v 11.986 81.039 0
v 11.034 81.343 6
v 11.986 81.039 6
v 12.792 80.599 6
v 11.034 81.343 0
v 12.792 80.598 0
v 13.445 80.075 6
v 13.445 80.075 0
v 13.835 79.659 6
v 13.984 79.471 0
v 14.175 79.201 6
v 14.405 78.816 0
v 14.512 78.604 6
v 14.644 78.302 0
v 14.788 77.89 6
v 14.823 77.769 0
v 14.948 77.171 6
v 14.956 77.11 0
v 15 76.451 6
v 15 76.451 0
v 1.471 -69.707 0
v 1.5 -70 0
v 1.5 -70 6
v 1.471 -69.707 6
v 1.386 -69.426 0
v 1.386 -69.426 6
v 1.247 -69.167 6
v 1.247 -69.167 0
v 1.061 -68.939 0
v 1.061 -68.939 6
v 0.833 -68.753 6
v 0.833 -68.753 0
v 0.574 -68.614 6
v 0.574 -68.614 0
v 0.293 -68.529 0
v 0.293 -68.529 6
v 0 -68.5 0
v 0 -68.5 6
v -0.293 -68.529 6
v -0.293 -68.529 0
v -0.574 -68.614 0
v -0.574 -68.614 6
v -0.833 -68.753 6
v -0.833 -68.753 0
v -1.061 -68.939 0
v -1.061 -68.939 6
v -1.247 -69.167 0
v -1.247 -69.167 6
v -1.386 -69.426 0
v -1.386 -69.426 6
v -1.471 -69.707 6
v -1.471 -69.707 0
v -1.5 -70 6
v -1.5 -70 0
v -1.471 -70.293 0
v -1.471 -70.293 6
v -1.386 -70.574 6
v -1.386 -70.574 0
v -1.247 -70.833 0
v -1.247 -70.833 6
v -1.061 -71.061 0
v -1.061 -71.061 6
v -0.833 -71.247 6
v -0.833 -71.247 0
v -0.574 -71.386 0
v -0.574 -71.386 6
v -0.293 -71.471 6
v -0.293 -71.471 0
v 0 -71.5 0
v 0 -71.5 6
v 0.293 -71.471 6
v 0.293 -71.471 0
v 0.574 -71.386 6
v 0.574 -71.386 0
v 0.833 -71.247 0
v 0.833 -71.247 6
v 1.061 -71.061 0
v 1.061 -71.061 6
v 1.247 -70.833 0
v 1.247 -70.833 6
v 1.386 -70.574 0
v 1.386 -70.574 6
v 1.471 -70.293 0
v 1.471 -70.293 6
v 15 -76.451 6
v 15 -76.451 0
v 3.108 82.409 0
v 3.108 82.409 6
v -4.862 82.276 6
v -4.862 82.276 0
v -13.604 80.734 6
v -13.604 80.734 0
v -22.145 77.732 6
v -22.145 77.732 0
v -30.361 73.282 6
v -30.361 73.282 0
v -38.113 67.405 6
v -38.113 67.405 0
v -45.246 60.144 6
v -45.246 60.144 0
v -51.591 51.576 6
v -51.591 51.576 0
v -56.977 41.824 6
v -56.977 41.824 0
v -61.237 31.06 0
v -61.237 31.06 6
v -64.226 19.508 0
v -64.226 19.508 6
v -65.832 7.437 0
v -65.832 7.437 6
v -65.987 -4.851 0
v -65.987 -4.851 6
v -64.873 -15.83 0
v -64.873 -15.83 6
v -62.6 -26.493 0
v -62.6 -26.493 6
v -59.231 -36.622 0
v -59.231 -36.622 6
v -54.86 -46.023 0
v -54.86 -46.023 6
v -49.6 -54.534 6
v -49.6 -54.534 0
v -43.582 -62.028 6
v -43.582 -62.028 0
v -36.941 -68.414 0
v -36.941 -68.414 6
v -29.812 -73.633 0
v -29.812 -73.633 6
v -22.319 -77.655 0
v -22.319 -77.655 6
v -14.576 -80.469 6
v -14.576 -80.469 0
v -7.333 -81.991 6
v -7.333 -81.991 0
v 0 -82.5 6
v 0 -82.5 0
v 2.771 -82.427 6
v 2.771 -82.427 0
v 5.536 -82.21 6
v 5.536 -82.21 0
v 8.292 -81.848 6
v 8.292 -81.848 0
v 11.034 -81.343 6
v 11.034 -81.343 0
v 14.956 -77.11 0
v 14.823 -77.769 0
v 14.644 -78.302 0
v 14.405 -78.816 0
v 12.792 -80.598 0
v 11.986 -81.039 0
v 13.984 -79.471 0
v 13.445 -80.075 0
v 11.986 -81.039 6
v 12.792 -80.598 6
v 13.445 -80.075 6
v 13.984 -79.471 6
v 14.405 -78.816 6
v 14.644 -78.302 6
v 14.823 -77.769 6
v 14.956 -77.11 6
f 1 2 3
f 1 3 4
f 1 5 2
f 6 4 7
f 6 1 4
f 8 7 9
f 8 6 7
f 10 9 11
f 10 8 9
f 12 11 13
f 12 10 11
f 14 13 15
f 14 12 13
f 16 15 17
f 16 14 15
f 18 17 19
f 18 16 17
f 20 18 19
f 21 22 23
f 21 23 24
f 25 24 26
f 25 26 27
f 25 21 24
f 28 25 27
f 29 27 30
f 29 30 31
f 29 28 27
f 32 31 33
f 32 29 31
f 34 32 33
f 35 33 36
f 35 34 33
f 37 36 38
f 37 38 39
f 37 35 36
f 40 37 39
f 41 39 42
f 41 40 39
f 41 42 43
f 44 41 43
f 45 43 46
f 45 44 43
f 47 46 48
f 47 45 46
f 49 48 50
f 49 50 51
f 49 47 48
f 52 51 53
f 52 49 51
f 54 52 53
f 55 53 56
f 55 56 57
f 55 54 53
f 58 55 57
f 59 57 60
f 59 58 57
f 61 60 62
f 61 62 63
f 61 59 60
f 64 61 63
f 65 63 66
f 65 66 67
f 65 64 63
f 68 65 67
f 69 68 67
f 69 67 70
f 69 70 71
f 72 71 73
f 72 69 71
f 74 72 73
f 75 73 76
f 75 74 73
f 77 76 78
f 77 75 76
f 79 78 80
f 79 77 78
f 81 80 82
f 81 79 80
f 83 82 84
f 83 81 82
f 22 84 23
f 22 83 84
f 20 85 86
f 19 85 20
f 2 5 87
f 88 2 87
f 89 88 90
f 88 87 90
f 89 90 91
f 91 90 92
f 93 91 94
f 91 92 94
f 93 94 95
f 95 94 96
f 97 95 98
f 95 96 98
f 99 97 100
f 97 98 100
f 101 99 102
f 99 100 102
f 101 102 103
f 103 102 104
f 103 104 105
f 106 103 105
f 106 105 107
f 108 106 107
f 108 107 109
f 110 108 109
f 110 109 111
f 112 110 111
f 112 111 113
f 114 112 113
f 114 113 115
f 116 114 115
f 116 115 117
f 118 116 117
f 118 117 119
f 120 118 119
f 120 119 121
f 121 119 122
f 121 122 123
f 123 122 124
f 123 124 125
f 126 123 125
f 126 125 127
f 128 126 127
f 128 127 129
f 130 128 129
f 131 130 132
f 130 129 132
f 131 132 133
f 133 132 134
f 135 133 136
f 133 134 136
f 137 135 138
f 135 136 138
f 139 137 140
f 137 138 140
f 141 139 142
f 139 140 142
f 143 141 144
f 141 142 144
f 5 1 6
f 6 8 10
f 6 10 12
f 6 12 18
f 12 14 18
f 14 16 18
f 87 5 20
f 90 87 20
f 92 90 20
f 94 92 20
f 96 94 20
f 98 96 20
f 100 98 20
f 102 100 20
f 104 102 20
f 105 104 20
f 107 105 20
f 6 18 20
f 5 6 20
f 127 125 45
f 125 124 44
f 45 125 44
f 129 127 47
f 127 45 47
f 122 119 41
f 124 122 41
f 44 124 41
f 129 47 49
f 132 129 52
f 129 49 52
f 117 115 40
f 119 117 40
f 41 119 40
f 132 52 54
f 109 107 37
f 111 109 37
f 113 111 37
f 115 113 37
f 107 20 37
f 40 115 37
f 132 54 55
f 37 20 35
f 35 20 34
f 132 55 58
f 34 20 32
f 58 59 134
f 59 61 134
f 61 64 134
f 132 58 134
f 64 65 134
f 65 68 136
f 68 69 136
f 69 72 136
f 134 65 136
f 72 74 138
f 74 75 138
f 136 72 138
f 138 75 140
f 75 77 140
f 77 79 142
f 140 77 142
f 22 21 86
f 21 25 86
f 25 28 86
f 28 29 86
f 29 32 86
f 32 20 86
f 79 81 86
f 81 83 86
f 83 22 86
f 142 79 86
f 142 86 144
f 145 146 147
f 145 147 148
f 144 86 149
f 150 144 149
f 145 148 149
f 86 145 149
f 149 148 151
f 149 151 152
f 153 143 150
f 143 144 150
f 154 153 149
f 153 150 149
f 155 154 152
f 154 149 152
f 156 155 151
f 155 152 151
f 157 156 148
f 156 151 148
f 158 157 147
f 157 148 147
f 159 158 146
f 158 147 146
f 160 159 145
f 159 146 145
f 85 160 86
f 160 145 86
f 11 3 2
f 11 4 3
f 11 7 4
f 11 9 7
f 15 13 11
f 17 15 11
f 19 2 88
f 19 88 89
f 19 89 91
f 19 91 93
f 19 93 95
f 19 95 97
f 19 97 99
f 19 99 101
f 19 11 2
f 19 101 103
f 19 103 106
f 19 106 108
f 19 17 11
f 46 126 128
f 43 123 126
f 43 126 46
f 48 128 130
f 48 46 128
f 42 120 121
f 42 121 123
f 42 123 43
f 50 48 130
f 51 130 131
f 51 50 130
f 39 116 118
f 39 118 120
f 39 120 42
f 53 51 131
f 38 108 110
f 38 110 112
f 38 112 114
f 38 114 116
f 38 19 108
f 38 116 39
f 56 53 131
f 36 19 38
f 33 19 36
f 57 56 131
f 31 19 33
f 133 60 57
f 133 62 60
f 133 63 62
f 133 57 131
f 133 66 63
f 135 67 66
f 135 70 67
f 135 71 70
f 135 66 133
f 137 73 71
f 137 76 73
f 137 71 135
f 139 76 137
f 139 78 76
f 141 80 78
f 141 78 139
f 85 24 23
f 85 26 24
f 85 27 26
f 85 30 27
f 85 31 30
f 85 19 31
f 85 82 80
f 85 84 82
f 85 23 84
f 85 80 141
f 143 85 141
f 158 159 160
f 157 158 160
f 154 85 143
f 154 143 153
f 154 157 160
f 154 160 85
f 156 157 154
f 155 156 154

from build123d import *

# Parameters (mm, degrees)
SKETCH1_RX          = 82.5
SKETCH1_RY          = 66.100974472
SKETCH1_R           = 1.5
BOSS_EXTRUDE1_DEPTH = 6
CUT_EXTRUDE1_DEPTH  = 10
FILLET1_R           = 5


with BuildPart() as part:
    # Sketch1 → Boss-Extrude1 (new body)
    with BuildSketch(Plane.XY):
        with Locations(Location((0, 0), (0, 0, -90))):
            Ellipse(SKETCH1_RX, SKETCH1_RY)
        with Locations((0, -70)):
            Circle(SKETCH1_R, mode=Mode.SUBTRACT)
    extrude(amount=BOSS_EXTRUDE1_DEPTH)

    # Sketch2 → Cut-Extrude1 (cut)
    with BuildSketch(Plane.XY.offset(6)):
        Polygon((15, -139.275656824), (15, 151.801672259), (87.864363855, 144.832157463), (90.234186387, -139.275656824), align=None)
    extrude(amount=-CUT_EXTRUDE1_DEPTH, mode=Mode.SUBTRACT)

    # Fillet1
    fillet1_edges = [part.edges().sort_by_distance(p)[0] for p in [
        (15, -80.347748934, 3),
        (15, 80.347748934, 3),
    ]]
    fillet(fillet1_edges, radius=FILLET1_R)


solid = part.part
